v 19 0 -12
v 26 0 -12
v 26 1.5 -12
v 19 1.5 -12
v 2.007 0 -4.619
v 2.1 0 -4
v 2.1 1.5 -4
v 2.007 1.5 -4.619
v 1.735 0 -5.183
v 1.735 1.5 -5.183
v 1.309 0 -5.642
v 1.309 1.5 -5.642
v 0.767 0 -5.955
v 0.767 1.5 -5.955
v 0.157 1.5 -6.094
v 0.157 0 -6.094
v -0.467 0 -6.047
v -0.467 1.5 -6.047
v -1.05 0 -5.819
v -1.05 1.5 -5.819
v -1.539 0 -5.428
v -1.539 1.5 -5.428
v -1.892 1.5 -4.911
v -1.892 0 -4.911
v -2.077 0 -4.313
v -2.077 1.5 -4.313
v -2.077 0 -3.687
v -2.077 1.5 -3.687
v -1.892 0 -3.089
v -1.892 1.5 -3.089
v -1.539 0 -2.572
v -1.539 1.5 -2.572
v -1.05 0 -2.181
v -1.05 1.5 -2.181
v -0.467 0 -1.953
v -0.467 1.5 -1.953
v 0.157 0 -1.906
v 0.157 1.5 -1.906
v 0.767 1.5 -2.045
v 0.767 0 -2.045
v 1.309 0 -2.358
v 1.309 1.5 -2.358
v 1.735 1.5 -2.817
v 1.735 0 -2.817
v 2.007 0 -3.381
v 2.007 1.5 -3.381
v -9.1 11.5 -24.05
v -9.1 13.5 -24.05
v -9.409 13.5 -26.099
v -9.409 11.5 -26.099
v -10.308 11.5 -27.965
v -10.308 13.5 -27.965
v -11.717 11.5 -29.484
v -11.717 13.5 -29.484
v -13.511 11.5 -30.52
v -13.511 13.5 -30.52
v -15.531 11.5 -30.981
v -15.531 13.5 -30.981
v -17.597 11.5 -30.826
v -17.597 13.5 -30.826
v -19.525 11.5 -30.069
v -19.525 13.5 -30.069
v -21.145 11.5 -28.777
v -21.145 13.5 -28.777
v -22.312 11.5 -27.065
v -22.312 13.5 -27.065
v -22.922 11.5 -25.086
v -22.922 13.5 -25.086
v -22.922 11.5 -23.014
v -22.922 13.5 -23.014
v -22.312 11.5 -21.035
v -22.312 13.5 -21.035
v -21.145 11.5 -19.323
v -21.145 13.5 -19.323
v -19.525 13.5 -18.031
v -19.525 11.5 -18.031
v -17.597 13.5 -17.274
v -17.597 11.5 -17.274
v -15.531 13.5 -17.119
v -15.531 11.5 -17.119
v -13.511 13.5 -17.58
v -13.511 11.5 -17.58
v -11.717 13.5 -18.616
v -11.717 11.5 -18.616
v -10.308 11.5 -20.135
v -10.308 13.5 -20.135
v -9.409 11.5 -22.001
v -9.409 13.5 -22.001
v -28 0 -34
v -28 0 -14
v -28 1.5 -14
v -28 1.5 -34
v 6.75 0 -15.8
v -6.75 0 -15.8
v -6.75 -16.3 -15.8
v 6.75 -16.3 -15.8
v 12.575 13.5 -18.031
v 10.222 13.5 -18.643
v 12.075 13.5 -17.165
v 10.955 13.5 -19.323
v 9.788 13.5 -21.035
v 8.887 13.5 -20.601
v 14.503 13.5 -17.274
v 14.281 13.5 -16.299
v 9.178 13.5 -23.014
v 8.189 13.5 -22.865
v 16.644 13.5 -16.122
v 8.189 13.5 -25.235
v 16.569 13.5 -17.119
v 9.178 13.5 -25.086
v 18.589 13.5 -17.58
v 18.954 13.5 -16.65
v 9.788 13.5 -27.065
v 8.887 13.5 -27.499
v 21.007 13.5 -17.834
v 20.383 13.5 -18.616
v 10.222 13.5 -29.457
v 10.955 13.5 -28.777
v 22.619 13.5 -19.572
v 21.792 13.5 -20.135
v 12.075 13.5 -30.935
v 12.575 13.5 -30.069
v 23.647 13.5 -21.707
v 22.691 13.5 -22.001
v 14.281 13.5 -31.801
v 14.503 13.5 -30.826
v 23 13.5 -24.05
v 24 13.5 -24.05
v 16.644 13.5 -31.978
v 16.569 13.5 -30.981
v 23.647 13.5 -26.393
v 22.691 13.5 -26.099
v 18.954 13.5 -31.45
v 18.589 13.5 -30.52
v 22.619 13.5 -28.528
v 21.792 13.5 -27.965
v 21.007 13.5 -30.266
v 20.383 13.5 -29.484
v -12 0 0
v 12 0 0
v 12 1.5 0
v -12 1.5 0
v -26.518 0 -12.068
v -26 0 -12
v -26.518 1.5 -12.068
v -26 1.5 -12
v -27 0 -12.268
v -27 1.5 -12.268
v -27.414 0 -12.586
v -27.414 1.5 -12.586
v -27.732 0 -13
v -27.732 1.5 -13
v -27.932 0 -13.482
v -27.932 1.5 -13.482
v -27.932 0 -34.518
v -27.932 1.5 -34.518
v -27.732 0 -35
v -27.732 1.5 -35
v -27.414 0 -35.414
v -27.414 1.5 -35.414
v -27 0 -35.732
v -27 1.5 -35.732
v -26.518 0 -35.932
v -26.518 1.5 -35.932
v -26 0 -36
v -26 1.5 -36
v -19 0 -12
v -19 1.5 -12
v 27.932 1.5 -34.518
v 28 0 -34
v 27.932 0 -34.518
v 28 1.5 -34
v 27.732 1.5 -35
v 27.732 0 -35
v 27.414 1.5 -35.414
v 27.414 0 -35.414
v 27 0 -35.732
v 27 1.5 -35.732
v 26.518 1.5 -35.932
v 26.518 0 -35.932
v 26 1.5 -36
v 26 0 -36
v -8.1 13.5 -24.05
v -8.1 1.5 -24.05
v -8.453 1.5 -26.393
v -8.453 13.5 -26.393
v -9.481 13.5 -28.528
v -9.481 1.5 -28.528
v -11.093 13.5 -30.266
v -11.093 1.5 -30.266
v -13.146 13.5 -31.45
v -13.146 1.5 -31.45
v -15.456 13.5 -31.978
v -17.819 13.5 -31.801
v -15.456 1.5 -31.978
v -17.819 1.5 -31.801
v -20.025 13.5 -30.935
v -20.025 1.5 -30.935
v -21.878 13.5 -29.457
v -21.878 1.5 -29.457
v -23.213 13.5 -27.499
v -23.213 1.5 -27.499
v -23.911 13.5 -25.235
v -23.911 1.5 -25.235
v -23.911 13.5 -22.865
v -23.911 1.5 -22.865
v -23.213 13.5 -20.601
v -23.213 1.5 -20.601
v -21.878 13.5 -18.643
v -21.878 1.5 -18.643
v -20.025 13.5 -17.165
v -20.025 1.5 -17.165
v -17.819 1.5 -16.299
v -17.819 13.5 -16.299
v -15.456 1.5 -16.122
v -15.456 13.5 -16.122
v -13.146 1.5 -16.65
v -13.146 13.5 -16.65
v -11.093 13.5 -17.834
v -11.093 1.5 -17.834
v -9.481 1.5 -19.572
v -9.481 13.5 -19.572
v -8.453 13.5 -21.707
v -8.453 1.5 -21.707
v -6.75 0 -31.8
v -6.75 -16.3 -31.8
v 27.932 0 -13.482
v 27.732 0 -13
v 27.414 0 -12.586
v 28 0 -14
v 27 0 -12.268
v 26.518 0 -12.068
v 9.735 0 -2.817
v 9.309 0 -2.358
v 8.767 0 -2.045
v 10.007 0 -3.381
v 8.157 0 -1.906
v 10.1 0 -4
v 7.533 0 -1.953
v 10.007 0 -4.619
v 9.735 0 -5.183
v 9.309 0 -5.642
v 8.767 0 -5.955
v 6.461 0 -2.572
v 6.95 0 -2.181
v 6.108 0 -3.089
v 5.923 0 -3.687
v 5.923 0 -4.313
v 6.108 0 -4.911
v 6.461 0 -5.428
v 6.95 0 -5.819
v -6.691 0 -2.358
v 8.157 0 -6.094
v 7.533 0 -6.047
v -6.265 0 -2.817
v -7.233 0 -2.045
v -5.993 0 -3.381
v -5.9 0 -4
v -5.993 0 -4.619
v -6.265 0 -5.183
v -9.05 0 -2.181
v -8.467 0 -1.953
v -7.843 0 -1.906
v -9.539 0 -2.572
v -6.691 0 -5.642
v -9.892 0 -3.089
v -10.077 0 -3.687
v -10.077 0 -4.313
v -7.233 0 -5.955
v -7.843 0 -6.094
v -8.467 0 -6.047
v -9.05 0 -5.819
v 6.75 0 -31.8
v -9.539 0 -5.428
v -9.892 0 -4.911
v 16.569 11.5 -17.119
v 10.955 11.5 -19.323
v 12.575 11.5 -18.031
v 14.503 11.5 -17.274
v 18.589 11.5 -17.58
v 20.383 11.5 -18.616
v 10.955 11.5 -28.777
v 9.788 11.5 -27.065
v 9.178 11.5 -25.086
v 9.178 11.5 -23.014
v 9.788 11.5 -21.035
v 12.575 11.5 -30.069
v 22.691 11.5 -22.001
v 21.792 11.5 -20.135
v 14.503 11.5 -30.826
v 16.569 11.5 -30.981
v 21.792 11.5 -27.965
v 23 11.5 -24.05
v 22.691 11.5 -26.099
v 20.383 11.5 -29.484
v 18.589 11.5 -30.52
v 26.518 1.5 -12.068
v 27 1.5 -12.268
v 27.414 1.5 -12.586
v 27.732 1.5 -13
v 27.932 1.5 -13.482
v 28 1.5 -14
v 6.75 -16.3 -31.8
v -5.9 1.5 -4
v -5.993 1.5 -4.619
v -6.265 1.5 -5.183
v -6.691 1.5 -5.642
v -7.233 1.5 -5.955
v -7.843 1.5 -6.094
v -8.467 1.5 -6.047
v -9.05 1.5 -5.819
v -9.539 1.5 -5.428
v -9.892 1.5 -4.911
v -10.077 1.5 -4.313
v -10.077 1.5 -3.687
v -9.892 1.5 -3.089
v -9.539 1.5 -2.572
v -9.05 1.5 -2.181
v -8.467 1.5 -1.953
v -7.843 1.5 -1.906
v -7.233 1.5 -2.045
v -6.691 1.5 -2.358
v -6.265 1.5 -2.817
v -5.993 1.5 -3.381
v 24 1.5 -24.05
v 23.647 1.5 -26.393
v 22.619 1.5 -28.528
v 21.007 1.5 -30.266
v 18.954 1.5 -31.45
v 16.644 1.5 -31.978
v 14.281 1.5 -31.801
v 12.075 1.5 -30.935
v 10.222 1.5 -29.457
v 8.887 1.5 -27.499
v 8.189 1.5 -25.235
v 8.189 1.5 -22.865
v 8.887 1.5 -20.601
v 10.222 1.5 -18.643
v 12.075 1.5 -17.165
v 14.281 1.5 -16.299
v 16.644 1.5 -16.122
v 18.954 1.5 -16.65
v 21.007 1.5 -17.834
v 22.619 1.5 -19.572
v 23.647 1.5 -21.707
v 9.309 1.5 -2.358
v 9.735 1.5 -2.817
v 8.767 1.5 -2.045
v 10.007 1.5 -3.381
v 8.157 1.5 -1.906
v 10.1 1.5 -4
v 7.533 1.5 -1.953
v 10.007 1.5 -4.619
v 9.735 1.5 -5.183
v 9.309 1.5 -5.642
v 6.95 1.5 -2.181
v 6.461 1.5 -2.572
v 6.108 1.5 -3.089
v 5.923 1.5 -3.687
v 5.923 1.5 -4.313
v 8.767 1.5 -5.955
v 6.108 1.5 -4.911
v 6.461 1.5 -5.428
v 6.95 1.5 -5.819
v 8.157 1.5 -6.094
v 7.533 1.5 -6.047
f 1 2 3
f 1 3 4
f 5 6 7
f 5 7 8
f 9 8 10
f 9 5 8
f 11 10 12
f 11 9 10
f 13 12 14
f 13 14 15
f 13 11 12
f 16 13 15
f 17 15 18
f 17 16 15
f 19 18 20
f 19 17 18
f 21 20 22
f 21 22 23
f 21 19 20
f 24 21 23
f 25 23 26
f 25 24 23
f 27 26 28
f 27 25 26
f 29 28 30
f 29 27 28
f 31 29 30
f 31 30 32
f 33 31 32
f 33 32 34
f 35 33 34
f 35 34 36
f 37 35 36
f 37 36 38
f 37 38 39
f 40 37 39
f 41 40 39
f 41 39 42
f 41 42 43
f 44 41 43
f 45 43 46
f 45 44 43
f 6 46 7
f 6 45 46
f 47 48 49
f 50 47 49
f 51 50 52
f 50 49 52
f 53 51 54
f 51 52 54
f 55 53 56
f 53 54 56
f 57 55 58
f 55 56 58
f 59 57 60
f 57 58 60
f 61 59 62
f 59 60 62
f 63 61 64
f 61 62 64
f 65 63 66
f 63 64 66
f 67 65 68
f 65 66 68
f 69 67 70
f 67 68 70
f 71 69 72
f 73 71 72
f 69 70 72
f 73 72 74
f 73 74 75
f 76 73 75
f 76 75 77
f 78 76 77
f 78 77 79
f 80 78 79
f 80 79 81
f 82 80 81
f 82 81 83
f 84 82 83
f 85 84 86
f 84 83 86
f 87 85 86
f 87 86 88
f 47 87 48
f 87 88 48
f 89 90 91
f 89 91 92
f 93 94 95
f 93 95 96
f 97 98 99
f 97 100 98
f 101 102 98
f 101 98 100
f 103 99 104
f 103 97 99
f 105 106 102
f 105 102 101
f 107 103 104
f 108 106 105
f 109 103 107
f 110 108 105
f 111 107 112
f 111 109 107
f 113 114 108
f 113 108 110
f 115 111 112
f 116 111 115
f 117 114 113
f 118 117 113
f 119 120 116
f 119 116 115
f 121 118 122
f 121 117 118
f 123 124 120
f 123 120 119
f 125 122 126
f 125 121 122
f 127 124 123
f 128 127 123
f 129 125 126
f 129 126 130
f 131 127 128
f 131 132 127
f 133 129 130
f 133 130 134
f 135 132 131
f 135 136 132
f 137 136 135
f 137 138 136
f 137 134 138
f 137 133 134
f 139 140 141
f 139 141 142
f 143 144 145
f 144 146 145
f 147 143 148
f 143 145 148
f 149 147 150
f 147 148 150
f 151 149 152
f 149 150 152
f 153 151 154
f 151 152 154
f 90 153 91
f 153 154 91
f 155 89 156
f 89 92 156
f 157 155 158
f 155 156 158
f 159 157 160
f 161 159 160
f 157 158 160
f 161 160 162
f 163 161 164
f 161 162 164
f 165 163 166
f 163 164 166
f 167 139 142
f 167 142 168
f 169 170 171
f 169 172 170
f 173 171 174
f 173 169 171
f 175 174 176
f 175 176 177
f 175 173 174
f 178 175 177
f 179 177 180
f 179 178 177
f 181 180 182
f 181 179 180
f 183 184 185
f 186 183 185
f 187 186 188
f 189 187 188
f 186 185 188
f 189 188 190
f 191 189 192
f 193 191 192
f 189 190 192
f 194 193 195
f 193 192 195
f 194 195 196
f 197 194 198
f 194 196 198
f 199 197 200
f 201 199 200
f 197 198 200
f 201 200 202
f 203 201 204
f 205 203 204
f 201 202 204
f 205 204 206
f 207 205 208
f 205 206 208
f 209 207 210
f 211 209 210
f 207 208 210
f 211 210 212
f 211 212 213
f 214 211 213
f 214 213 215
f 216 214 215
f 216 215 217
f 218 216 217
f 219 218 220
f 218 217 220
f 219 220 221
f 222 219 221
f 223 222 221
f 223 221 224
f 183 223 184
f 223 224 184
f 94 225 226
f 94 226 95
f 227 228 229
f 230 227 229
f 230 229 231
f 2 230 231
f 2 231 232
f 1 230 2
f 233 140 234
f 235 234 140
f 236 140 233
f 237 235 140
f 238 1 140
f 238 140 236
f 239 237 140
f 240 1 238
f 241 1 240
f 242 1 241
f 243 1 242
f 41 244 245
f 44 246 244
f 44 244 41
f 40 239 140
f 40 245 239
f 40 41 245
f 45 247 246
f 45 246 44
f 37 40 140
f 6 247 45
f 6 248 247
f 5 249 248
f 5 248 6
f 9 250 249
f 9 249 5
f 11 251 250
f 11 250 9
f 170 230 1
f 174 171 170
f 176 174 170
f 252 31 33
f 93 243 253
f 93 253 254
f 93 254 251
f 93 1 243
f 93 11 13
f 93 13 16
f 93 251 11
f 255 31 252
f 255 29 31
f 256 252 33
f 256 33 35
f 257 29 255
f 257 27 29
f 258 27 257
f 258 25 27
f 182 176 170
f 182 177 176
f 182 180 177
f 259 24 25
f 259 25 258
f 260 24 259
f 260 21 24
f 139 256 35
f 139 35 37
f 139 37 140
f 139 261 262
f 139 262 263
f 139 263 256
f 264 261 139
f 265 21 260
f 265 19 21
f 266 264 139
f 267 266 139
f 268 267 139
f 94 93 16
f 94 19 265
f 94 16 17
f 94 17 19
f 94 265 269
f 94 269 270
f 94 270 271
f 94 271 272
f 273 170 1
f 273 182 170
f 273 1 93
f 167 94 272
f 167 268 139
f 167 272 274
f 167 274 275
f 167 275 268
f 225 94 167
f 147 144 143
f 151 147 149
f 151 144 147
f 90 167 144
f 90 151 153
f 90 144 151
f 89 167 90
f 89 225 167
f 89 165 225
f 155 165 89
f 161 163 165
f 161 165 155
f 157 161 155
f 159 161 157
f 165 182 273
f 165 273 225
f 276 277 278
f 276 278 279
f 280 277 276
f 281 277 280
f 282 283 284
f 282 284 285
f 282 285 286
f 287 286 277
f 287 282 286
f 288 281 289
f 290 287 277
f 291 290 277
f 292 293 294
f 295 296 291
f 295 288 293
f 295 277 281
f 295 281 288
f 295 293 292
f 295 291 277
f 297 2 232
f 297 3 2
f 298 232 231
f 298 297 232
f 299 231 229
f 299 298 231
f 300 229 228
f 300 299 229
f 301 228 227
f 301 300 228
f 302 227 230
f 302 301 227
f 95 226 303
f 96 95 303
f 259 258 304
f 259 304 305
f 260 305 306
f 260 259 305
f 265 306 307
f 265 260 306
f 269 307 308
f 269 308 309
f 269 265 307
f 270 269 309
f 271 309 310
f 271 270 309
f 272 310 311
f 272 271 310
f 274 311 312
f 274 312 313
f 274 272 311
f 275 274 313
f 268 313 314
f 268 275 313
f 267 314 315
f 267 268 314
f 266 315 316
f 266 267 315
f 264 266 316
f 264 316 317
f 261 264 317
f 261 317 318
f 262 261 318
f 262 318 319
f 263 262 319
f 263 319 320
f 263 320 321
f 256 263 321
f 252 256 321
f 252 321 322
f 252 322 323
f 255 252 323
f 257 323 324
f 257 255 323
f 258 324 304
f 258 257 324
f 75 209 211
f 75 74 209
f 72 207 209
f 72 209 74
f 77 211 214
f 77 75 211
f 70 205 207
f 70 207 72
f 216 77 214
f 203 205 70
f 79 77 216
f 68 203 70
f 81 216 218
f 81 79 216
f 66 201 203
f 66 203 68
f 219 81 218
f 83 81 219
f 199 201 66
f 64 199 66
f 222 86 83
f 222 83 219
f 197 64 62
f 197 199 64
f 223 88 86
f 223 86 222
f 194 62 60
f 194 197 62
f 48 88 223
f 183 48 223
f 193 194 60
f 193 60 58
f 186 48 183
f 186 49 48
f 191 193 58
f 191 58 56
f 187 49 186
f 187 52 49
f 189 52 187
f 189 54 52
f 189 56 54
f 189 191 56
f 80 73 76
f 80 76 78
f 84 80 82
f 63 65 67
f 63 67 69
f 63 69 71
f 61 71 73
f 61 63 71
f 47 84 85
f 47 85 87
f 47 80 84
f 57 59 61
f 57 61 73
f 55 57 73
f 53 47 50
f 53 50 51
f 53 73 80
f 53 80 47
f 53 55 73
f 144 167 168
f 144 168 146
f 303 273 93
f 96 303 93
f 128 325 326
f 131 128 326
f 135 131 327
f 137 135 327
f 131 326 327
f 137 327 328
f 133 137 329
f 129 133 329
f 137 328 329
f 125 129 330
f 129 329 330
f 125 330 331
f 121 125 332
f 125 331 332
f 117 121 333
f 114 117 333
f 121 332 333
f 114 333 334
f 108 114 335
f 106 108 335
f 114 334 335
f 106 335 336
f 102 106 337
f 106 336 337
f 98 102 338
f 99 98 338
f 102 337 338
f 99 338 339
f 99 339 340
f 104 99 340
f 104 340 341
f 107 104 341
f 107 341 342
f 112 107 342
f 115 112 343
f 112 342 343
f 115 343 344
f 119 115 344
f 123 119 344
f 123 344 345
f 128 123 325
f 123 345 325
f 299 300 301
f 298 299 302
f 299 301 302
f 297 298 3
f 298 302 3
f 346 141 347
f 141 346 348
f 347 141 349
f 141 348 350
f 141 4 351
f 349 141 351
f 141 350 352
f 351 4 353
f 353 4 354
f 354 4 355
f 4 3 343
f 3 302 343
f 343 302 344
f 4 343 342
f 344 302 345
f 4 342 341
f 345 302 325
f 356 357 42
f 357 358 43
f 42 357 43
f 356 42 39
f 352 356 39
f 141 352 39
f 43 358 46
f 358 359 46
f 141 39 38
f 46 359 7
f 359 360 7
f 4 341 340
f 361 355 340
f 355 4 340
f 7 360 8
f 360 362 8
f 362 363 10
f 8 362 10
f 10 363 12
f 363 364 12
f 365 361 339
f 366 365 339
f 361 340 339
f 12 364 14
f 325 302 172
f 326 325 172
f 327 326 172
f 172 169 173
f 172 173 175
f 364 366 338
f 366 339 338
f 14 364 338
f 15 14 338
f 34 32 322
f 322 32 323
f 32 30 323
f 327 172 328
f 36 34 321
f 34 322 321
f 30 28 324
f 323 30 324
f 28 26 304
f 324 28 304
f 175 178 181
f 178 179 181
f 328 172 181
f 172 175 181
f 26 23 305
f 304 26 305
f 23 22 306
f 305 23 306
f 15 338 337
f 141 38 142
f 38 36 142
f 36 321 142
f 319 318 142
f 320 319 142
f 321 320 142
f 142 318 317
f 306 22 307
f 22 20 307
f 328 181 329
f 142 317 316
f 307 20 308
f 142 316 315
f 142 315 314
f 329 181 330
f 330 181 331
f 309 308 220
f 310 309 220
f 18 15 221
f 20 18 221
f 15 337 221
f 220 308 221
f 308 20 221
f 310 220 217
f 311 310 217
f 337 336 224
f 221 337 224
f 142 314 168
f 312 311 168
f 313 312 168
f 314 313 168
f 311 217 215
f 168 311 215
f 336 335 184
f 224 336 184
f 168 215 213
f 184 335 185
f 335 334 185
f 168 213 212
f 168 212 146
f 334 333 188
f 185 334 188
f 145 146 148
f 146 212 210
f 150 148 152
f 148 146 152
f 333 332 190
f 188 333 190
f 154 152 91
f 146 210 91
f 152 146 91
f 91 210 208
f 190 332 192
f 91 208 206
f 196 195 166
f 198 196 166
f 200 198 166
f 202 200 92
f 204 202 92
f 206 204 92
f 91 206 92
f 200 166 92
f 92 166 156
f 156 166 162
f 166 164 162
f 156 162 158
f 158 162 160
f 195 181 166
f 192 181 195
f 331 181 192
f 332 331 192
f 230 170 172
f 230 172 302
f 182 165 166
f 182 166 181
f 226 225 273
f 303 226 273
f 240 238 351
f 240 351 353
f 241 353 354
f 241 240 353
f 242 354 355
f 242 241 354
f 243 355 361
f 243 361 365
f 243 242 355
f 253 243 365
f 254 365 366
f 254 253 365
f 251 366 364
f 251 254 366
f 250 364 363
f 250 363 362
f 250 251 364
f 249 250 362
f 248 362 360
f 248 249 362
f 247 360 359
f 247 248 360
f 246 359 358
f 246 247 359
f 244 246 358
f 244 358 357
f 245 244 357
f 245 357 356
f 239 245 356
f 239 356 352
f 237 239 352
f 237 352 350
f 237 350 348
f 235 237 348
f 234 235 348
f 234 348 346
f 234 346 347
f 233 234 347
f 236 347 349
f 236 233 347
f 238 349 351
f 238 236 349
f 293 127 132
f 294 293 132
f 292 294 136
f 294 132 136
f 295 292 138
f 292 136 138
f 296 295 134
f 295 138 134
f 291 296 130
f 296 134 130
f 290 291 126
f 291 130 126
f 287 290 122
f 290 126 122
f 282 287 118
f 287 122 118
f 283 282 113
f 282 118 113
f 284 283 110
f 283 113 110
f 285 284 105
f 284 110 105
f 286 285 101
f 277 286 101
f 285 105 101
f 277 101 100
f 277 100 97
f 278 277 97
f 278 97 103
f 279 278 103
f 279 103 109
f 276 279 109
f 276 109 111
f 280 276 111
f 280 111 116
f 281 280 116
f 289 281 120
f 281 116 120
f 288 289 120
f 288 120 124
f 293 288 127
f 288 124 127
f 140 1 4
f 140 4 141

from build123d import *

# Parameters (mm, degrees)
SKETCH1_R           = 2.1
BOSS_EXTRUDE1_DEPTH = 1.5
FILLET1_R           = 2
SKETCH2_R           = 7.95
BOSS_EXTRUDE2_DEPTH = 12
SKETCH3_W           = 13.5
SKETCH3_H           = 16
BOSS_EXTRUDE3_DEPTH = 16.3
SKETCH4_R           = 6.95
CUT_EXTRUDE1_DEPTH  = 2


with BuildPart() as part:
    # Sketch1 → Boss-Extrude1 (new body)
    with BuildSketch(Plane(origin=(0, 0, 0), x_dir=(1, 0, 0), z_dir=(0, 1, 0))):
        Polygon((12, 0), (-12, 0), (-19, 12), (-28, 12), (-28, 36), (28, 36), (28, 12), (19, 12), align=None)
        with Locations((0, 4)):
            Circle(SKETCH1_R, mode=Mode.SUBTRACT)
        with Locations((-8, 4)):
            Circle(SKETCH1_R, mode=Mode.SUBTRACT)
        with Locations((8, 4)):
            Circle(SKETCH1_R, mode=Mode.SUBTRACT)
    extrude(amount=BOSS_EXTRUDE1_DEPTH)

    # Fillet1
    fillet1_edges = [part.edges().sort_by_distance(p)[0] for p in [
        (-28, 0.75, -12),
        (-28, 0.75, -36),
        (28, 0.75, -36),
        (28, 0.75, -12),
    ]]
    fillet(fillet1_edges, radius=FILLET1_R)

    # Sketch2 → Boss-Extrude2 (add)
    with BuildSketch(Plane(origin=(0, 1.5, 0), x_dir=(1, 0, 0), z_dir=(0, 1, 0))):
        with Locations((-16.05, 24.05)):
            Circle(SKETCH2_R)
        with Locations((16.05, 24.05)):
            Circle(SKETCH2_R)
    extrude(amount=BOSS_EXTRUDE2_DEPTH)

    # Sketch3 → Boss-Extrude3 (add)
    with BuildSketch(Plane.XZ):
        with Locations((0, -23.8)):
            Rectangle(SKETCH3_W, SKETCH3_H)
    extrude(amount=BOSS_EXTRUDE3_DEPTH)

    # Sketch4 → Cut-Extrude1 (cut)
    with BuildSketch(Plane(origin=(0, 13.5, 0), x_dir=(1, 0, 0), z_dir=(0, 1, 0))):
        with Locations((-16.05, 24.05)):
            Circle(SKETCH4_R)
        with Locations((16.05, 24.05)):
            Circle(SKETCH4_R)
    extrude(amount=-CUT_EXTRUDE1_DEPTH, mode=Mode.SUBTRACT)


solid = part.part
